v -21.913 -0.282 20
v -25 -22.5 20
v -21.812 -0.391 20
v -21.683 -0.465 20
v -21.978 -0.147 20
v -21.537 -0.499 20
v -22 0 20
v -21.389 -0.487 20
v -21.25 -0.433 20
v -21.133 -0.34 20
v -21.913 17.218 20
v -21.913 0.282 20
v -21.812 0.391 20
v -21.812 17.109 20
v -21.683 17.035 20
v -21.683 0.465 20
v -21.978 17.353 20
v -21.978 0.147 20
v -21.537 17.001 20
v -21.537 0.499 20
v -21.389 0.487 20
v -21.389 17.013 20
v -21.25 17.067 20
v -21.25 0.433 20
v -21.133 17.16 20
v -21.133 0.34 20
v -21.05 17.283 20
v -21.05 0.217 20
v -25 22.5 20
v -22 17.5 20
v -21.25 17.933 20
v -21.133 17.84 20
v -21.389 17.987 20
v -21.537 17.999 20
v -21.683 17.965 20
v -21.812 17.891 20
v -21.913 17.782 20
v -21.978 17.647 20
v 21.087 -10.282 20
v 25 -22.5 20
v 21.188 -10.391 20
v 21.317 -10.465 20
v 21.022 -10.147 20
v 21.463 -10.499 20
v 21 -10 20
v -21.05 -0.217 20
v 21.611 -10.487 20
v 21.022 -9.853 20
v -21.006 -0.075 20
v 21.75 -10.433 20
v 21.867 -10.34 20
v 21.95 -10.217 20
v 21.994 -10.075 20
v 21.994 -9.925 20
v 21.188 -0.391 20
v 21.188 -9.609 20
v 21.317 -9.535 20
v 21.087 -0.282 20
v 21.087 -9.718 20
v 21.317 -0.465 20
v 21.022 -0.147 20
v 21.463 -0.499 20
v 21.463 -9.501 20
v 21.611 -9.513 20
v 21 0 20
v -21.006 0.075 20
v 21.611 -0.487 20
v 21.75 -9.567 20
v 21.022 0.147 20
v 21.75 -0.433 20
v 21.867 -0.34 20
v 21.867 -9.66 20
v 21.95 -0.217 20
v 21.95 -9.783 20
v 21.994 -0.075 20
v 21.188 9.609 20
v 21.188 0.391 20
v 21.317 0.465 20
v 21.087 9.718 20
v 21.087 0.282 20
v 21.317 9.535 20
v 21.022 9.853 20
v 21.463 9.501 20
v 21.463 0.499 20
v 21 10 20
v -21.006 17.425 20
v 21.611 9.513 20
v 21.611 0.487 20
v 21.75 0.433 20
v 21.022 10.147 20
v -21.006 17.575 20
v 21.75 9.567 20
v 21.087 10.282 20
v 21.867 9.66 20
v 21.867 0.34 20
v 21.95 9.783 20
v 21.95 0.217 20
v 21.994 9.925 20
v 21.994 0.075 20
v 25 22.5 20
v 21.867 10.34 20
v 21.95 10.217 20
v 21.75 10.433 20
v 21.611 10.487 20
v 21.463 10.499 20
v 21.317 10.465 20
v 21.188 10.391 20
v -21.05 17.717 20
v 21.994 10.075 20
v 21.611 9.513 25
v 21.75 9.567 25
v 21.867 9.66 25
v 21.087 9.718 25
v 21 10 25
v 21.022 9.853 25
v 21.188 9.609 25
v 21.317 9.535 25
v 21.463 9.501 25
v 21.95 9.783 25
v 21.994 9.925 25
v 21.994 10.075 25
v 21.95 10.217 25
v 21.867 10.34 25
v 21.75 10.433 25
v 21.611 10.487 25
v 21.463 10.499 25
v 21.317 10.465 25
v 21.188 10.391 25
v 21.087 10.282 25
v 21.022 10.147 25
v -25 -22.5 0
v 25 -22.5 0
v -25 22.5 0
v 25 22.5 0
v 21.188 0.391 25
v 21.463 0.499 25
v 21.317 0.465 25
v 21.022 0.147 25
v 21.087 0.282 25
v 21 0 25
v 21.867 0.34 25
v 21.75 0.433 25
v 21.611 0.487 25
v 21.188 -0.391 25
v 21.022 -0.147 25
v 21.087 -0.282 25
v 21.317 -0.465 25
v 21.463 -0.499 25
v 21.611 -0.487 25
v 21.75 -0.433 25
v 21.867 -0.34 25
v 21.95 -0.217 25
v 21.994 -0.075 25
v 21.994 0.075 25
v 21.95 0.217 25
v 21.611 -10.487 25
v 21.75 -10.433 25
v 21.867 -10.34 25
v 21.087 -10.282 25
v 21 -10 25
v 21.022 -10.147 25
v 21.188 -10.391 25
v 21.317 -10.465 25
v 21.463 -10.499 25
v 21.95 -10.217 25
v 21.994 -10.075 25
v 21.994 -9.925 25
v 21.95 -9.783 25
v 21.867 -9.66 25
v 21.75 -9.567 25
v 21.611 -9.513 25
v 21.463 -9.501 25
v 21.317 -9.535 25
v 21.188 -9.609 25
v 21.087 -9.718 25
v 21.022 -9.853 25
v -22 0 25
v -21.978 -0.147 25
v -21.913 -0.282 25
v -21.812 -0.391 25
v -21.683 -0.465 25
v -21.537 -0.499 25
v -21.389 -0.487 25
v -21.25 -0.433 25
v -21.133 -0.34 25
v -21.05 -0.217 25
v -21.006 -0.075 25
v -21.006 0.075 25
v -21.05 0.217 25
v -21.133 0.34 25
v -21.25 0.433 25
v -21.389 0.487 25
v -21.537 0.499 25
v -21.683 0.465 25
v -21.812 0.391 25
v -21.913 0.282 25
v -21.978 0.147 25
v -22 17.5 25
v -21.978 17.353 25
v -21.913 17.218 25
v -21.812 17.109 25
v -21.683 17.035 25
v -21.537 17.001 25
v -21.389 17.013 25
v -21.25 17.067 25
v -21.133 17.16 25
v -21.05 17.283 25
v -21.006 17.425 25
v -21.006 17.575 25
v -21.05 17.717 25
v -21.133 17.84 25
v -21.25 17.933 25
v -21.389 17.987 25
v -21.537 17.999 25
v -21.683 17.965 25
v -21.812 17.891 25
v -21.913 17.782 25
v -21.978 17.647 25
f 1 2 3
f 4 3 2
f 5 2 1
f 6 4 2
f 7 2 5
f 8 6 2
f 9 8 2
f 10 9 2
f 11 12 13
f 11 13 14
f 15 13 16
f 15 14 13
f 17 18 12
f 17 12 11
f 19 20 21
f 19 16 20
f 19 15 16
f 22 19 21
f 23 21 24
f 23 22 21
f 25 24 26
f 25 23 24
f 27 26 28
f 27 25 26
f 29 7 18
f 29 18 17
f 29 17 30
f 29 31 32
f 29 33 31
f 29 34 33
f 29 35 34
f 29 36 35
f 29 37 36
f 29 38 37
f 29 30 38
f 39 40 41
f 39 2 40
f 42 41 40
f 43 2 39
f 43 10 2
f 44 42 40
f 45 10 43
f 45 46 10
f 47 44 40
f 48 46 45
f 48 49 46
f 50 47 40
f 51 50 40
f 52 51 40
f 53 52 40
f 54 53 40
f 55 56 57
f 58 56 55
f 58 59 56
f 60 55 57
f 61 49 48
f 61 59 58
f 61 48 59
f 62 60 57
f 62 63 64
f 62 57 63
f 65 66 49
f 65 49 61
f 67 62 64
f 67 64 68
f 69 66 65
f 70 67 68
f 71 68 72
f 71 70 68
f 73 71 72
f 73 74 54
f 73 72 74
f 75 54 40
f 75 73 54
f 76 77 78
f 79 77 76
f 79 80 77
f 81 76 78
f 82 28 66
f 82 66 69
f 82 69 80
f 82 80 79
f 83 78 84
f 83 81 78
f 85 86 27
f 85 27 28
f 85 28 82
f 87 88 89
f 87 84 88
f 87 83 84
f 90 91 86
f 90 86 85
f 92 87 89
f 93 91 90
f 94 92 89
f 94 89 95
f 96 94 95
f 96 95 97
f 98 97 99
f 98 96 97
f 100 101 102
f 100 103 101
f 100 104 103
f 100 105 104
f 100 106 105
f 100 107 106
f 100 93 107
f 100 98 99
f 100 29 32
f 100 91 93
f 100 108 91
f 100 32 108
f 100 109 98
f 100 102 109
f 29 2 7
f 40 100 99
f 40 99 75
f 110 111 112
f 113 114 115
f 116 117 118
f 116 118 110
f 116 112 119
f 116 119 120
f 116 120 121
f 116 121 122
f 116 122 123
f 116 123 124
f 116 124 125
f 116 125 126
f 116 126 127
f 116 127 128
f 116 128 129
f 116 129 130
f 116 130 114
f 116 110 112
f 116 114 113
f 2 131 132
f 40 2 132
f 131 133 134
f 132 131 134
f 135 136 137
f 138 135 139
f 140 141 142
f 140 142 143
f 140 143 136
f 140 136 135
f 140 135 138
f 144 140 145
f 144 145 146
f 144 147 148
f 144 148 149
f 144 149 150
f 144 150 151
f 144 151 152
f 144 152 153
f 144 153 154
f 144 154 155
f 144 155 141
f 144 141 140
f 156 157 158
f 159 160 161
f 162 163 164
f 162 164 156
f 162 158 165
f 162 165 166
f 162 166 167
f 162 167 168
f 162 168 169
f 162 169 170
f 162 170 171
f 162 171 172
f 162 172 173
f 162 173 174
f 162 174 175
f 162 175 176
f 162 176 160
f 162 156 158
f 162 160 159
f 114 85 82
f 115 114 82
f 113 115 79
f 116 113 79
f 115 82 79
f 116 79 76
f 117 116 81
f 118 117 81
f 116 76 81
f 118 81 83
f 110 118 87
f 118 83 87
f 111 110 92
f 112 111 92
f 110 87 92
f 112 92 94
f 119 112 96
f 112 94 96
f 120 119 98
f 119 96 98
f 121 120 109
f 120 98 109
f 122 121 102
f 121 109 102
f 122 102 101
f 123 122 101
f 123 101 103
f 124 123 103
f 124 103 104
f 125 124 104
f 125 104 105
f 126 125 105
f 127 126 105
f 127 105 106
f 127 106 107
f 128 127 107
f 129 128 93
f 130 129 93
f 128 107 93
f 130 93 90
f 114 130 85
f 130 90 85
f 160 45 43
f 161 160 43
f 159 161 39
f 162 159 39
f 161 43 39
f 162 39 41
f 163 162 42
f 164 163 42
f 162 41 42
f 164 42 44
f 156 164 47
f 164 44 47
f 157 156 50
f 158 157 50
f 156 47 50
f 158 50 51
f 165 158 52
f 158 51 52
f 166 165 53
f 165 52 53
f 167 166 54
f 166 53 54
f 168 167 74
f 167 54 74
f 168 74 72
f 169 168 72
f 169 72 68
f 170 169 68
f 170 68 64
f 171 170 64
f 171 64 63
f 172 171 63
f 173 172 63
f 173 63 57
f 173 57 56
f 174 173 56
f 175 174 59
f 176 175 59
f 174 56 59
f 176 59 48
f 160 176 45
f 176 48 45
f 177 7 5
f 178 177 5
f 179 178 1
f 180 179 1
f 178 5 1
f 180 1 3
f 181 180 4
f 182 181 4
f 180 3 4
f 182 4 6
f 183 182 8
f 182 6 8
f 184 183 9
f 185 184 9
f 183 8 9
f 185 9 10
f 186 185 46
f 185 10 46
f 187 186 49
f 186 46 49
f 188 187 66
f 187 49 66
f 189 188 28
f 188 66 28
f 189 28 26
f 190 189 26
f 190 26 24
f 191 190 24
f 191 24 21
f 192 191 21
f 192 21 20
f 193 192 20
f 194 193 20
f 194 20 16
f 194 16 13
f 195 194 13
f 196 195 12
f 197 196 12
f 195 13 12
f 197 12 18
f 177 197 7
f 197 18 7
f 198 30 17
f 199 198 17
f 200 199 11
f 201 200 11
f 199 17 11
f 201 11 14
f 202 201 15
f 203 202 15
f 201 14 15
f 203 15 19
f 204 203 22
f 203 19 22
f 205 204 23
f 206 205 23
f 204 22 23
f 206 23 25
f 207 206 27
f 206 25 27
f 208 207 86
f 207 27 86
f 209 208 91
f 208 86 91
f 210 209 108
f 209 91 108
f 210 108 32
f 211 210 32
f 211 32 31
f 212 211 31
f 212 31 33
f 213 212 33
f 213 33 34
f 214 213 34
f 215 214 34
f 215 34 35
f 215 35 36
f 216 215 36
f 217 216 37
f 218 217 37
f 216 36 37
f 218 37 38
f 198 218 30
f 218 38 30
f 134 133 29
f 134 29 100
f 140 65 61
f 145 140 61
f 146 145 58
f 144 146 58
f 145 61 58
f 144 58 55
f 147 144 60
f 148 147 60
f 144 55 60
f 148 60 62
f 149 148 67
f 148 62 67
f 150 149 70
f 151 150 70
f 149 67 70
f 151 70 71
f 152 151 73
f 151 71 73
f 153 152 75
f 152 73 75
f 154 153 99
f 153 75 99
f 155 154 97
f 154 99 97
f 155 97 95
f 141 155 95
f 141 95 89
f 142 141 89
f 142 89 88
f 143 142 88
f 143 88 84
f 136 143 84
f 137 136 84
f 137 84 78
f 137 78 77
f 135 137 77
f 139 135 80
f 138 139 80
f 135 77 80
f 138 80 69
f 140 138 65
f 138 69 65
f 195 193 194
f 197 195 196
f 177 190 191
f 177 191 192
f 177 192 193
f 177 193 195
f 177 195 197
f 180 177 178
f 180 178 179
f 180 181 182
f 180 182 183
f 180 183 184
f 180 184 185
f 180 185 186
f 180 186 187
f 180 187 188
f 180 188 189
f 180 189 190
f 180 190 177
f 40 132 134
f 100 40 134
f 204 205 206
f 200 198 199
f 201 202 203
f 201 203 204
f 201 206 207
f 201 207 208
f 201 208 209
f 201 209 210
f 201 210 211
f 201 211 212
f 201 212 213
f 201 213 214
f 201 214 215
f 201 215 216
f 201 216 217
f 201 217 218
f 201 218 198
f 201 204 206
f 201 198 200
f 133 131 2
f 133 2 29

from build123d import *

# Parameters (mm, degrees)
SKETCH_1_W      = 50
SKETCH_1_H      = 45
EXTRUDE_1_DEPTH = 20
SKETCH_2_R      = 0.5
EXTRUDE_2_DEPTH = 5


with BuildPart() as part:
    # Эскиз1 → Вытянуть1 (new body)
    with BuildSketch(Plane.XY):
        Rectangle(SKETCH_1_W, SKETCH_1_H)
    extrude(amount=EXTRUDE_1_DEPTH)

    # Эскиз2 → Вытянуть2 (add)
    with BuildSketch(Plane.XY.offset(20)):
        with Locations(Location((-21.5, 17.5, 0), (0, 0, 180))):
            Circle(SKETCH_2_R)
        with Locations(Location((-21.5, 0, 0), (0, 0, 180))):
            Circle(SKETCH_2_R)
        with Locations(Location((21.5, 0, 0), (0, 0, 180))):
            Circle(SKETCH_2_R)
        with Locations(Location((21.5, 10, 0), (0, 0, 180))):
            Circle(SKETCH_2_R)
        with Locations(Location((21.5, -10, 0), (0, 0, 180))):
            Circle(SKETCH_2_R)
    extrude(amount=EXTRUDE_2_DEPTH)


solid = part.part
